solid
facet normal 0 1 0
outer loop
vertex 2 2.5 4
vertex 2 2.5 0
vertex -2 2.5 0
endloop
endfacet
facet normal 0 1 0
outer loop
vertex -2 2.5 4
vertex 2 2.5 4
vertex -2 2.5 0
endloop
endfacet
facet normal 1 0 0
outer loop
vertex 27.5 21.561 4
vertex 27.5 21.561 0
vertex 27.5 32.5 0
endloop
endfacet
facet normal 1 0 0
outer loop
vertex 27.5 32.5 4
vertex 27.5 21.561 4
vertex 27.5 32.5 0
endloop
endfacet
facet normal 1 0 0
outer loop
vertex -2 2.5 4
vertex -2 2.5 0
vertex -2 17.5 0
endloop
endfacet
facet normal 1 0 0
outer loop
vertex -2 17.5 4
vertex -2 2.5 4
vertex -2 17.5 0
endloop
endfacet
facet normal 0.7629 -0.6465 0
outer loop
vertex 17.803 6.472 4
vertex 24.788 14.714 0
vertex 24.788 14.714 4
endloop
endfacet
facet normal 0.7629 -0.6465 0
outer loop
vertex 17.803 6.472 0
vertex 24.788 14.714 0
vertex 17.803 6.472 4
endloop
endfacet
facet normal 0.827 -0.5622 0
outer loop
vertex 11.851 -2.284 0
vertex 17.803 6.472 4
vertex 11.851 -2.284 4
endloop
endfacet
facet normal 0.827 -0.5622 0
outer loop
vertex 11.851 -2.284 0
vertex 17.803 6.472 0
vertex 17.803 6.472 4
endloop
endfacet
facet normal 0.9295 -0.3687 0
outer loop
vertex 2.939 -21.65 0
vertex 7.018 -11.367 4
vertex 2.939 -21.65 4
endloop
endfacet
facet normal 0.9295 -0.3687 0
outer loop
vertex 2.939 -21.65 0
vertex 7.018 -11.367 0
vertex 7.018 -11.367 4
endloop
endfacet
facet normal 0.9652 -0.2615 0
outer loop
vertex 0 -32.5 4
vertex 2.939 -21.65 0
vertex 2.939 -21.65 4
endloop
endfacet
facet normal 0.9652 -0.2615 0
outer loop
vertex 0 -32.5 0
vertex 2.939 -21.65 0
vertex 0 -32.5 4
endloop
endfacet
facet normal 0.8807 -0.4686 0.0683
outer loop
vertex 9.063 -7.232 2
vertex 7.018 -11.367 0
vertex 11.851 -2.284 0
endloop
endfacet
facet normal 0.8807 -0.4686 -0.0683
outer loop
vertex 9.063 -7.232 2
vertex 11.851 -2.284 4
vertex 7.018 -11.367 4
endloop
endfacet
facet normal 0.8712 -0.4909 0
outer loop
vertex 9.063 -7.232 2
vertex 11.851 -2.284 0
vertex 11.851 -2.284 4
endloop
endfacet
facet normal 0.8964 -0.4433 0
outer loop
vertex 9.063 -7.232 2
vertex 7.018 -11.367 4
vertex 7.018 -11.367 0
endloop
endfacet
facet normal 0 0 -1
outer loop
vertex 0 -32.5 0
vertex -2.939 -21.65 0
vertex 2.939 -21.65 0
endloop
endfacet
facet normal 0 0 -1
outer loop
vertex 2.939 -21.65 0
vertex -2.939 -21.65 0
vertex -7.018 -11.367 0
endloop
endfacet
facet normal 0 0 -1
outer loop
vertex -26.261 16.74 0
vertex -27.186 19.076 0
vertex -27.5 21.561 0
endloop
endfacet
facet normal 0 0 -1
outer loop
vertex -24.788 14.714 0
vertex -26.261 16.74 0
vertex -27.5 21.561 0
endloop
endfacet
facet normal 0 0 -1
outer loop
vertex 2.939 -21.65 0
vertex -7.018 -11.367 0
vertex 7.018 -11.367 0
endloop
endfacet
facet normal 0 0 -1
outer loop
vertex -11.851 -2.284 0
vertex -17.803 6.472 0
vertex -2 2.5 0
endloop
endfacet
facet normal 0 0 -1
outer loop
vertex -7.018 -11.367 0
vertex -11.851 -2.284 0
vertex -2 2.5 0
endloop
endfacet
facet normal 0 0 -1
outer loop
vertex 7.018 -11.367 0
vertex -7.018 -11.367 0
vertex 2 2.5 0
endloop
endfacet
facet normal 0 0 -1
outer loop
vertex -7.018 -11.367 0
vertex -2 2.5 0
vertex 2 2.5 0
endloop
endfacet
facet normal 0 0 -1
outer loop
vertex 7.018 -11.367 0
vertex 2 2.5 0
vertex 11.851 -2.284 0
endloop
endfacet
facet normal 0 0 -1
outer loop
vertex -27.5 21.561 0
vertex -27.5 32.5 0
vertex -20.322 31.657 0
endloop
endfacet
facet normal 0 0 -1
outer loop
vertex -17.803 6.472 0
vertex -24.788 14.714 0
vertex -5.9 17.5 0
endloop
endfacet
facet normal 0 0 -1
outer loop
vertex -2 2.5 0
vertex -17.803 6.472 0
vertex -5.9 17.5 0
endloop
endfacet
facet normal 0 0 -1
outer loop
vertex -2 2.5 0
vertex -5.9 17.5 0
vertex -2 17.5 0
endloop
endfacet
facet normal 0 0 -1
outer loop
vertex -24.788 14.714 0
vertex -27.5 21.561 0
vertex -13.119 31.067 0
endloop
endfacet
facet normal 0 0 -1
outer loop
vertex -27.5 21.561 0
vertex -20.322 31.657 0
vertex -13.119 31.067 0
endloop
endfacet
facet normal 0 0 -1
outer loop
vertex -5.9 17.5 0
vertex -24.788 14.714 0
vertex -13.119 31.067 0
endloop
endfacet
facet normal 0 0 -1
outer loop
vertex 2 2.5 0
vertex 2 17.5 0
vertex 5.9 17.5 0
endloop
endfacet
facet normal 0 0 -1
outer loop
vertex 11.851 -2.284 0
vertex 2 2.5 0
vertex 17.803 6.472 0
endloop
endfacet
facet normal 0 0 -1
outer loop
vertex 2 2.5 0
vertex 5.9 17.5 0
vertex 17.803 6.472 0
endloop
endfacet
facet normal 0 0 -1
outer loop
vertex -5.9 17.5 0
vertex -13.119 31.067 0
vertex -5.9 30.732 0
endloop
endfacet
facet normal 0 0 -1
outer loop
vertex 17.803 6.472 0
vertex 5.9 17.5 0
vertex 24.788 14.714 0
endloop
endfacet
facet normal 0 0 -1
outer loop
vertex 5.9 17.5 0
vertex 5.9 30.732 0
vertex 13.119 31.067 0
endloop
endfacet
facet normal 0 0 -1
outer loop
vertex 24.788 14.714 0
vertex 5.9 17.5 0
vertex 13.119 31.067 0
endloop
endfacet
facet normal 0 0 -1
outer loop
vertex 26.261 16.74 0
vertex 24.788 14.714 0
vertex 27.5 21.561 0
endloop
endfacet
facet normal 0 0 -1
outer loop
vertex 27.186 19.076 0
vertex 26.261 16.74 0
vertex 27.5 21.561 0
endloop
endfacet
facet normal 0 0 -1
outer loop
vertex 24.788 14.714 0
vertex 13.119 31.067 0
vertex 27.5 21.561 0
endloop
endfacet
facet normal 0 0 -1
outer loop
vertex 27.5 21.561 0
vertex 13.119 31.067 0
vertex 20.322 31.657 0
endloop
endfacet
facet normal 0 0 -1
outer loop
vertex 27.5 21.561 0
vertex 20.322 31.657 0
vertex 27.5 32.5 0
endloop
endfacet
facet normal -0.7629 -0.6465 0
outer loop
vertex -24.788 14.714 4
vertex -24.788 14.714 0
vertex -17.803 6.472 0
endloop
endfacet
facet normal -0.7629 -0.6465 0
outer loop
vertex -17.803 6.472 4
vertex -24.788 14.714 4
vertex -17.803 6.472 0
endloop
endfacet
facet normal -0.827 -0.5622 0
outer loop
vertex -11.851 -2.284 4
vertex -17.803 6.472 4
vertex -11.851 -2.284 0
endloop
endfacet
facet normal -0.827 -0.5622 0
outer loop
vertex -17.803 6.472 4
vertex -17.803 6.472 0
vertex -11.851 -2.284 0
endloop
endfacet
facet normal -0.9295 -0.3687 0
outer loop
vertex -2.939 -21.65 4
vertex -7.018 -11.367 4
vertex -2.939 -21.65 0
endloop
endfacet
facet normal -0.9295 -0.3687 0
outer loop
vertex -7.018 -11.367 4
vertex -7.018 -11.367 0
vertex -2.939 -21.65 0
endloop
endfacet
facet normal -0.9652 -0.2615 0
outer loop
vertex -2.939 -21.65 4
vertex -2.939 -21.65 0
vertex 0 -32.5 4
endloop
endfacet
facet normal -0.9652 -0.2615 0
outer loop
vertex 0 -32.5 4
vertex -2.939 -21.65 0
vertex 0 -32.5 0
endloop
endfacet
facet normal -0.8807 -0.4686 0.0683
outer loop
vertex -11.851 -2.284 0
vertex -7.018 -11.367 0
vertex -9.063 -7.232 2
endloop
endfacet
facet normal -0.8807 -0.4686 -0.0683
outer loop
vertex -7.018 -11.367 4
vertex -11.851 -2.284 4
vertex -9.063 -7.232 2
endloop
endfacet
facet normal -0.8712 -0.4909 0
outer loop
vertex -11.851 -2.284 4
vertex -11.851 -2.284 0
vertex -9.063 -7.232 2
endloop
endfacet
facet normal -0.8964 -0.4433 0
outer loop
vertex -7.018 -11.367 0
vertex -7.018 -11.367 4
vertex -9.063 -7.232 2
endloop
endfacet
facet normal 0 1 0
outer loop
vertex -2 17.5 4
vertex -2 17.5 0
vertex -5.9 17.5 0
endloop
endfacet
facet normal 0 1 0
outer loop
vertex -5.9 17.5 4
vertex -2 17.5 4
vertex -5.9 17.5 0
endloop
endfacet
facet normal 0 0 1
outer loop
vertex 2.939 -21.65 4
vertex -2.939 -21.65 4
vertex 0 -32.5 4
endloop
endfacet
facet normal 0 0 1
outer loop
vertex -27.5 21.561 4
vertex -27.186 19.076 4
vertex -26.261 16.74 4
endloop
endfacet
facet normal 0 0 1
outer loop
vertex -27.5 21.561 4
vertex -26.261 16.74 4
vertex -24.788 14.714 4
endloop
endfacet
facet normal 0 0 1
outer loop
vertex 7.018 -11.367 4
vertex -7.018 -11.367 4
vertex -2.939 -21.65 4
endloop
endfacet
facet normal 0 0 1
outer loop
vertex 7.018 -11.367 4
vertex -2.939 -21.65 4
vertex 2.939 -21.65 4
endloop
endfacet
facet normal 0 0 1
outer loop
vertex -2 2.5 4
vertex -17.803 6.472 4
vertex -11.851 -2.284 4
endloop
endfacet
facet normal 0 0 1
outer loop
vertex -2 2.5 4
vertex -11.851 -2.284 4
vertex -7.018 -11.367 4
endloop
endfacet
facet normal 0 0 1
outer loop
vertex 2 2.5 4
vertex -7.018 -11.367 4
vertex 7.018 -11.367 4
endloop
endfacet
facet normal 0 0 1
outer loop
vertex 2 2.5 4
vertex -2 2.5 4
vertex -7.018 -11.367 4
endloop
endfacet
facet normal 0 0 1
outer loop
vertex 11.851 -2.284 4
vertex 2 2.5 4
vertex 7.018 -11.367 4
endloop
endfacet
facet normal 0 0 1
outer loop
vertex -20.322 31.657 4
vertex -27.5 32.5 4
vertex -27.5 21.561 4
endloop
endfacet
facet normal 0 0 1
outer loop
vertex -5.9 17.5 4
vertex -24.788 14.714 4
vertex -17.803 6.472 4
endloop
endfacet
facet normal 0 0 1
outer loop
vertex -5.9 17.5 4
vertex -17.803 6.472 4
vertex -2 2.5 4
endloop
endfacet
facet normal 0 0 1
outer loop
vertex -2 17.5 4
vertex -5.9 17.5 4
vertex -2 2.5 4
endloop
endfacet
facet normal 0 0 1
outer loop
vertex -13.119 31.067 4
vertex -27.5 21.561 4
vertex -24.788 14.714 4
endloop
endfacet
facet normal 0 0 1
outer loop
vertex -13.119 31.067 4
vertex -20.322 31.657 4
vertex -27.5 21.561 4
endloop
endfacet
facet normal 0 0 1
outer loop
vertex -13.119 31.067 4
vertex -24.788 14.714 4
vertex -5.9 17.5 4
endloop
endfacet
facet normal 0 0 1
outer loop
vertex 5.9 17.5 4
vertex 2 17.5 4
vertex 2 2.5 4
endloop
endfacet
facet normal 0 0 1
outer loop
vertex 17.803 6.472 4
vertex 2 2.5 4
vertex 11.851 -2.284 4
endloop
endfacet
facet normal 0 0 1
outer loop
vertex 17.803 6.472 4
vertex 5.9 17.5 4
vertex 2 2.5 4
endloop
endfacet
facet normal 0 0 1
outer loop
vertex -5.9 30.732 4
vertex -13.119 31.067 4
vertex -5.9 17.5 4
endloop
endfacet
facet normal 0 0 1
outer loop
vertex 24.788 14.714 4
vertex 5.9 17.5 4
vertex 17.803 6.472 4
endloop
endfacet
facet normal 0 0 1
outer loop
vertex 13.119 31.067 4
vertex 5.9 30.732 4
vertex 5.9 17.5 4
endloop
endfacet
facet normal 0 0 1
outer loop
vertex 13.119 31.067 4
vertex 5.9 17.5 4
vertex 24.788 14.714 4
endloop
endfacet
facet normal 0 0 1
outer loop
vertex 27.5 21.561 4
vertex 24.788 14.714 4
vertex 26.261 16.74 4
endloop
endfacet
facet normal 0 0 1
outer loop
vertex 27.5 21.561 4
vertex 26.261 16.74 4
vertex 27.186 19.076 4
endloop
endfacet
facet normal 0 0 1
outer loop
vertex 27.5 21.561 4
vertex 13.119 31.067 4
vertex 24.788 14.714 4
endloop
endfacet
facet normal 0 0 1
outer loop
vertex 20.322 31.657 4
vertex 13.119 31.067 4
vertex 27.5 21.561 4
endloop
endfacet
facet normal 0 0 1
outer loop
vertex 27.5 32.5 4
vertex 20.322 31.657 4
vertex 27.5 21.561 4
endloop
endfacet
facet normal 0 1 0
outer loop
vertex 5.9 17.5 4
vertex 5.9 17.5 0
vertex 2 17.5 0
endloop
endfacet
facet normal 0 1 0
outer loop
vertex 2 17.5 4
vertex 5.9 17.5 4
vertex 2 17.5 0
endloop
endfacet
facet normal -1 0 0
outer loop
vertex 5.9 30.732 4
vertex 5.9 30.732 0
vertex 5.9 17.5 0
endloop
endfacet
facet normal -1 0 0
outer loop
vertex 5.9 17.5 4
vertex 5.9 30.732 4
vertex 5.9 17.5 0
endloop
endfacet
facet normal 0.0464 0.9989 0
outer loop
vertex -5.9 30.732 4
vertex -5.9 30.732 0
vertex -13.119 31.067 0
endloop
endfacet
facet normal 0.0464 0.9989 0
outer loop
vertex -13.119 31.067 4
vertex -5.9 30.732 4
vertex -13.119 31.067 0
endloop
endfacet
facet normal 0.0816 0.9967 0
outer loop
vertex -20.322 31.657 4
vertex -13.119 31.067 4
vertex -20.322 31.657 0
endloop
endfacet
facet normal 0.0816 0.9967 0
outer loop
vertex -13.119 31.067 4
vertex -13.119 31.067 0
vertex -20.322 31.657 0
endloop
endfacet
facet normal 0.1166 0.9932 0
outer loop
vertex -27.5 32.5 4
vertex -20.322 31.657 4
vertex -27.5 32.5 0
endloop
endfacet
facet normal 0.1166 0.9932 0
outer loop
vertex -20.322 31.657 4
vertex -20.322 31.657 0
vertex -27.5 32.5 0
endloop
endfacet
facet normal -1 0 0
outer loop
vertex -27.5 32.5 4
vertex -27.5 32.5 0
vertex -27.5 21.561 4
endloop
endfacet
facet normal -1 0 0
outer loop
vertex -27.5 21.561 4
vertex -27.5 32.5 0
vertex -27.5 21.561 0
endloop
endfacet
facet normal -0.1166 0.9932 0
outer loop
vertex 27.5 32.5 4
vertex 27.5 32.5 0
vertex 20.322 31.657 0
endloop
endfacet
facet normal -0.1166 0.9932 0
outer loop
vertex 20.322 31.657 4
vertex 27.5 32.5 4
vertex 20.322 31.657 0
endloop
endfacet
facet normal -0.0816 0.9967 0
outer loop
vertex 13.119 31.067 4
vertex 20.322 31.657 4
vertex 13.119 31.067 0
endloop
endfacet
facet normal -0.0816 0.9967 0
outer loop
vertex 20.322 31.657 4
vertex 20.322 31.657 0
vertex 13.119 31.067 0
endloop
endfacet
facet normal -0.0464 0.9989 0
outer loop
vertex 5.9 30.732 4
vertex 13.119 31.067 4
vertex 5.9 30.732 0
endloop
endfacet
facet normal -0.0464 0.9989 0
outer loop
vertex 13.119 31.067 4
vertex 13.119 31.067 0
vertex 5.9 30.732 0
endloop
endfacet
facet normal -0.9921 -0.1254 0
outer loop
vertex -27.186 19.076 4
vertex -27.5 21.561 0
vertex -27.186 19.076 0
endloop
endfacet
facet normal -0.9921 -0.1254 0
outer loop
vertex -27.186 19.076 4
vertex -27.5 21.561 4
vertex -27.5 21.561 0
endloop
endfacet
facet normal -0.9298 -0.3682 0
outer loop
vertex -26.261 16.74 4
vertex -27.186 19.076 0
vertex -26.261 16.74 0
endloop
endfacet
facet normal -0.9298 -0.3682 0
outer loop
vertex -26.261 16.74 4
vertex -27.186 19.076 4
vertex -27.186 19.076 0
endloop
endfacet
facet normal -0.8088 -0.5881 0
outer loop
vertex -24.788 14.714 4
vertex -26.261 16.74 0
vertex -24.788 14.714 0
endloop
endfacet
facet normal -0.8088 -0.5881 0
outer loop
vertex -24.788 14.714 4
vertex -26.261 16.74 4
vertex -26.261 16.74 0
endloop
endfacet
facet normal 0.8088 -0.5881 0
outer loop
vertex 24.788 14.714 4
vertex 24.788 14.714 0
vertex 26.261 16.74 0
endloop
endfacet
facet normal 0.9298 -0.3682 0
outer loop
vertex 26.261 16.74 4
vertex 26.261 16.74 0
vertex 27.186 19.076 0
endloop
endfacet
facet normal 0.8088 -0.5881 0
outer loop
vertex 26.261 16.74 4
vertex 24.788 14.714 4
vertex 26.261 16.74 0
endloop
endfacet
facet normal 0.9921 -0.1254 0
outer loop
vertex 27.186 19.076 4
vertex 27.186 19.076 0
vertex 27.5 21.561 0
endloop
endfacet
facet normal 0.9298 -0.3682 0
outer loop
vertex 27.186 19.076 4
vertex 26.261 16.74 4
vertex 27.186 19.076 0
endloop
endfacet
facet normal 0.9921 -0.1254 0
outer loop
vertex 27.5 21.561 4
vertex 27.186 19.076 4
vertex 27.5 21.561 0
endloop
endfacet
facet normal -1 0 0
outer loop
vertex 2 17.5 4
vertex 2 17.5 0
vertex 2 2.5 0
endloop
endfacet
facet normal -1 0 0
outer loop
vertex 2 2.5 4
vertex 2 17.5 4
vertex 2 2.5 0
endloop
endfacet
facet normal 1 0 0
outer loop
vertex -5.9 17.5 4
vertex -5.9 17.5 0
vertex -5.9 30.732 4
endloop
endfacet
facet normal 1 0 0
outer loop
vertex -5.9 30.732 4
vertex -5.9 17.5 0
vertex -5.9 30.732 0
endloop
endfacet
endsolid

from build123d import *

# Parameters (mm, degrees)
BOSS_EXTRU_1_DEPTH = 4
CONG_1_R           = 10


with BuildPart() as part:
    # Esquisse1 → Boss.-Extru.1 (new body)
    with BuildSketch(Plane.XY):
        with BuildLine():
            Line((-27.5, 32.5), (-27.5, 17.5))
            add(Edge.make_bspline(
                [(-27.5, 17.5), (-6.129432255, -3.700842112), (0, -32.5)],
                knots=[0, 0, 0, 1, 1, 1], degree=2))
            add(Edge.make_bspline(
                [(27.5, 17.5), (6.129432255, -3.700842112), (0, -32.5)],
                knots=[0, 0, 0, 1, 1, 1], degree=2))
            Line((27.5, 17.5), (27.5, 32.5))
            ThreePointArc((27.5, 32.5), (16.723379615, 31.330378268), (5.9, 30.732034209))
            Line((5.9, 30.732034209), (5.9, 17.5))
            Line((5.9, 17.5), (2, 17.5))
            Line((2, 17.5), (2, 2.5))
            Line((2, 2.5), (-2, 2.5))
            Line((-2, 2.5), (-2, 17.5))
            Line((-2, 17.5), (-5.9, 17.5))
            Line((-5.9, 17.5), (-5.9, 30.732034209))
            ThreePointArc((-5.9, 30.732034209), (-16.723379615, 31.330378268), (-27.5, 32.5))
        make_face()
    extrude(amount=BOSS_EXTRU_1_DEPTH)

    # Congé1
    cong_1_edges = [part.edges().sort_by_distance(p)[0] for p in [
        (-27.5, 17.5, 2),
        (27.5, 17.5, 2),
    ]]
    fillet(cong_1_edges, radius=CONG_1_R)


solid = part.part
